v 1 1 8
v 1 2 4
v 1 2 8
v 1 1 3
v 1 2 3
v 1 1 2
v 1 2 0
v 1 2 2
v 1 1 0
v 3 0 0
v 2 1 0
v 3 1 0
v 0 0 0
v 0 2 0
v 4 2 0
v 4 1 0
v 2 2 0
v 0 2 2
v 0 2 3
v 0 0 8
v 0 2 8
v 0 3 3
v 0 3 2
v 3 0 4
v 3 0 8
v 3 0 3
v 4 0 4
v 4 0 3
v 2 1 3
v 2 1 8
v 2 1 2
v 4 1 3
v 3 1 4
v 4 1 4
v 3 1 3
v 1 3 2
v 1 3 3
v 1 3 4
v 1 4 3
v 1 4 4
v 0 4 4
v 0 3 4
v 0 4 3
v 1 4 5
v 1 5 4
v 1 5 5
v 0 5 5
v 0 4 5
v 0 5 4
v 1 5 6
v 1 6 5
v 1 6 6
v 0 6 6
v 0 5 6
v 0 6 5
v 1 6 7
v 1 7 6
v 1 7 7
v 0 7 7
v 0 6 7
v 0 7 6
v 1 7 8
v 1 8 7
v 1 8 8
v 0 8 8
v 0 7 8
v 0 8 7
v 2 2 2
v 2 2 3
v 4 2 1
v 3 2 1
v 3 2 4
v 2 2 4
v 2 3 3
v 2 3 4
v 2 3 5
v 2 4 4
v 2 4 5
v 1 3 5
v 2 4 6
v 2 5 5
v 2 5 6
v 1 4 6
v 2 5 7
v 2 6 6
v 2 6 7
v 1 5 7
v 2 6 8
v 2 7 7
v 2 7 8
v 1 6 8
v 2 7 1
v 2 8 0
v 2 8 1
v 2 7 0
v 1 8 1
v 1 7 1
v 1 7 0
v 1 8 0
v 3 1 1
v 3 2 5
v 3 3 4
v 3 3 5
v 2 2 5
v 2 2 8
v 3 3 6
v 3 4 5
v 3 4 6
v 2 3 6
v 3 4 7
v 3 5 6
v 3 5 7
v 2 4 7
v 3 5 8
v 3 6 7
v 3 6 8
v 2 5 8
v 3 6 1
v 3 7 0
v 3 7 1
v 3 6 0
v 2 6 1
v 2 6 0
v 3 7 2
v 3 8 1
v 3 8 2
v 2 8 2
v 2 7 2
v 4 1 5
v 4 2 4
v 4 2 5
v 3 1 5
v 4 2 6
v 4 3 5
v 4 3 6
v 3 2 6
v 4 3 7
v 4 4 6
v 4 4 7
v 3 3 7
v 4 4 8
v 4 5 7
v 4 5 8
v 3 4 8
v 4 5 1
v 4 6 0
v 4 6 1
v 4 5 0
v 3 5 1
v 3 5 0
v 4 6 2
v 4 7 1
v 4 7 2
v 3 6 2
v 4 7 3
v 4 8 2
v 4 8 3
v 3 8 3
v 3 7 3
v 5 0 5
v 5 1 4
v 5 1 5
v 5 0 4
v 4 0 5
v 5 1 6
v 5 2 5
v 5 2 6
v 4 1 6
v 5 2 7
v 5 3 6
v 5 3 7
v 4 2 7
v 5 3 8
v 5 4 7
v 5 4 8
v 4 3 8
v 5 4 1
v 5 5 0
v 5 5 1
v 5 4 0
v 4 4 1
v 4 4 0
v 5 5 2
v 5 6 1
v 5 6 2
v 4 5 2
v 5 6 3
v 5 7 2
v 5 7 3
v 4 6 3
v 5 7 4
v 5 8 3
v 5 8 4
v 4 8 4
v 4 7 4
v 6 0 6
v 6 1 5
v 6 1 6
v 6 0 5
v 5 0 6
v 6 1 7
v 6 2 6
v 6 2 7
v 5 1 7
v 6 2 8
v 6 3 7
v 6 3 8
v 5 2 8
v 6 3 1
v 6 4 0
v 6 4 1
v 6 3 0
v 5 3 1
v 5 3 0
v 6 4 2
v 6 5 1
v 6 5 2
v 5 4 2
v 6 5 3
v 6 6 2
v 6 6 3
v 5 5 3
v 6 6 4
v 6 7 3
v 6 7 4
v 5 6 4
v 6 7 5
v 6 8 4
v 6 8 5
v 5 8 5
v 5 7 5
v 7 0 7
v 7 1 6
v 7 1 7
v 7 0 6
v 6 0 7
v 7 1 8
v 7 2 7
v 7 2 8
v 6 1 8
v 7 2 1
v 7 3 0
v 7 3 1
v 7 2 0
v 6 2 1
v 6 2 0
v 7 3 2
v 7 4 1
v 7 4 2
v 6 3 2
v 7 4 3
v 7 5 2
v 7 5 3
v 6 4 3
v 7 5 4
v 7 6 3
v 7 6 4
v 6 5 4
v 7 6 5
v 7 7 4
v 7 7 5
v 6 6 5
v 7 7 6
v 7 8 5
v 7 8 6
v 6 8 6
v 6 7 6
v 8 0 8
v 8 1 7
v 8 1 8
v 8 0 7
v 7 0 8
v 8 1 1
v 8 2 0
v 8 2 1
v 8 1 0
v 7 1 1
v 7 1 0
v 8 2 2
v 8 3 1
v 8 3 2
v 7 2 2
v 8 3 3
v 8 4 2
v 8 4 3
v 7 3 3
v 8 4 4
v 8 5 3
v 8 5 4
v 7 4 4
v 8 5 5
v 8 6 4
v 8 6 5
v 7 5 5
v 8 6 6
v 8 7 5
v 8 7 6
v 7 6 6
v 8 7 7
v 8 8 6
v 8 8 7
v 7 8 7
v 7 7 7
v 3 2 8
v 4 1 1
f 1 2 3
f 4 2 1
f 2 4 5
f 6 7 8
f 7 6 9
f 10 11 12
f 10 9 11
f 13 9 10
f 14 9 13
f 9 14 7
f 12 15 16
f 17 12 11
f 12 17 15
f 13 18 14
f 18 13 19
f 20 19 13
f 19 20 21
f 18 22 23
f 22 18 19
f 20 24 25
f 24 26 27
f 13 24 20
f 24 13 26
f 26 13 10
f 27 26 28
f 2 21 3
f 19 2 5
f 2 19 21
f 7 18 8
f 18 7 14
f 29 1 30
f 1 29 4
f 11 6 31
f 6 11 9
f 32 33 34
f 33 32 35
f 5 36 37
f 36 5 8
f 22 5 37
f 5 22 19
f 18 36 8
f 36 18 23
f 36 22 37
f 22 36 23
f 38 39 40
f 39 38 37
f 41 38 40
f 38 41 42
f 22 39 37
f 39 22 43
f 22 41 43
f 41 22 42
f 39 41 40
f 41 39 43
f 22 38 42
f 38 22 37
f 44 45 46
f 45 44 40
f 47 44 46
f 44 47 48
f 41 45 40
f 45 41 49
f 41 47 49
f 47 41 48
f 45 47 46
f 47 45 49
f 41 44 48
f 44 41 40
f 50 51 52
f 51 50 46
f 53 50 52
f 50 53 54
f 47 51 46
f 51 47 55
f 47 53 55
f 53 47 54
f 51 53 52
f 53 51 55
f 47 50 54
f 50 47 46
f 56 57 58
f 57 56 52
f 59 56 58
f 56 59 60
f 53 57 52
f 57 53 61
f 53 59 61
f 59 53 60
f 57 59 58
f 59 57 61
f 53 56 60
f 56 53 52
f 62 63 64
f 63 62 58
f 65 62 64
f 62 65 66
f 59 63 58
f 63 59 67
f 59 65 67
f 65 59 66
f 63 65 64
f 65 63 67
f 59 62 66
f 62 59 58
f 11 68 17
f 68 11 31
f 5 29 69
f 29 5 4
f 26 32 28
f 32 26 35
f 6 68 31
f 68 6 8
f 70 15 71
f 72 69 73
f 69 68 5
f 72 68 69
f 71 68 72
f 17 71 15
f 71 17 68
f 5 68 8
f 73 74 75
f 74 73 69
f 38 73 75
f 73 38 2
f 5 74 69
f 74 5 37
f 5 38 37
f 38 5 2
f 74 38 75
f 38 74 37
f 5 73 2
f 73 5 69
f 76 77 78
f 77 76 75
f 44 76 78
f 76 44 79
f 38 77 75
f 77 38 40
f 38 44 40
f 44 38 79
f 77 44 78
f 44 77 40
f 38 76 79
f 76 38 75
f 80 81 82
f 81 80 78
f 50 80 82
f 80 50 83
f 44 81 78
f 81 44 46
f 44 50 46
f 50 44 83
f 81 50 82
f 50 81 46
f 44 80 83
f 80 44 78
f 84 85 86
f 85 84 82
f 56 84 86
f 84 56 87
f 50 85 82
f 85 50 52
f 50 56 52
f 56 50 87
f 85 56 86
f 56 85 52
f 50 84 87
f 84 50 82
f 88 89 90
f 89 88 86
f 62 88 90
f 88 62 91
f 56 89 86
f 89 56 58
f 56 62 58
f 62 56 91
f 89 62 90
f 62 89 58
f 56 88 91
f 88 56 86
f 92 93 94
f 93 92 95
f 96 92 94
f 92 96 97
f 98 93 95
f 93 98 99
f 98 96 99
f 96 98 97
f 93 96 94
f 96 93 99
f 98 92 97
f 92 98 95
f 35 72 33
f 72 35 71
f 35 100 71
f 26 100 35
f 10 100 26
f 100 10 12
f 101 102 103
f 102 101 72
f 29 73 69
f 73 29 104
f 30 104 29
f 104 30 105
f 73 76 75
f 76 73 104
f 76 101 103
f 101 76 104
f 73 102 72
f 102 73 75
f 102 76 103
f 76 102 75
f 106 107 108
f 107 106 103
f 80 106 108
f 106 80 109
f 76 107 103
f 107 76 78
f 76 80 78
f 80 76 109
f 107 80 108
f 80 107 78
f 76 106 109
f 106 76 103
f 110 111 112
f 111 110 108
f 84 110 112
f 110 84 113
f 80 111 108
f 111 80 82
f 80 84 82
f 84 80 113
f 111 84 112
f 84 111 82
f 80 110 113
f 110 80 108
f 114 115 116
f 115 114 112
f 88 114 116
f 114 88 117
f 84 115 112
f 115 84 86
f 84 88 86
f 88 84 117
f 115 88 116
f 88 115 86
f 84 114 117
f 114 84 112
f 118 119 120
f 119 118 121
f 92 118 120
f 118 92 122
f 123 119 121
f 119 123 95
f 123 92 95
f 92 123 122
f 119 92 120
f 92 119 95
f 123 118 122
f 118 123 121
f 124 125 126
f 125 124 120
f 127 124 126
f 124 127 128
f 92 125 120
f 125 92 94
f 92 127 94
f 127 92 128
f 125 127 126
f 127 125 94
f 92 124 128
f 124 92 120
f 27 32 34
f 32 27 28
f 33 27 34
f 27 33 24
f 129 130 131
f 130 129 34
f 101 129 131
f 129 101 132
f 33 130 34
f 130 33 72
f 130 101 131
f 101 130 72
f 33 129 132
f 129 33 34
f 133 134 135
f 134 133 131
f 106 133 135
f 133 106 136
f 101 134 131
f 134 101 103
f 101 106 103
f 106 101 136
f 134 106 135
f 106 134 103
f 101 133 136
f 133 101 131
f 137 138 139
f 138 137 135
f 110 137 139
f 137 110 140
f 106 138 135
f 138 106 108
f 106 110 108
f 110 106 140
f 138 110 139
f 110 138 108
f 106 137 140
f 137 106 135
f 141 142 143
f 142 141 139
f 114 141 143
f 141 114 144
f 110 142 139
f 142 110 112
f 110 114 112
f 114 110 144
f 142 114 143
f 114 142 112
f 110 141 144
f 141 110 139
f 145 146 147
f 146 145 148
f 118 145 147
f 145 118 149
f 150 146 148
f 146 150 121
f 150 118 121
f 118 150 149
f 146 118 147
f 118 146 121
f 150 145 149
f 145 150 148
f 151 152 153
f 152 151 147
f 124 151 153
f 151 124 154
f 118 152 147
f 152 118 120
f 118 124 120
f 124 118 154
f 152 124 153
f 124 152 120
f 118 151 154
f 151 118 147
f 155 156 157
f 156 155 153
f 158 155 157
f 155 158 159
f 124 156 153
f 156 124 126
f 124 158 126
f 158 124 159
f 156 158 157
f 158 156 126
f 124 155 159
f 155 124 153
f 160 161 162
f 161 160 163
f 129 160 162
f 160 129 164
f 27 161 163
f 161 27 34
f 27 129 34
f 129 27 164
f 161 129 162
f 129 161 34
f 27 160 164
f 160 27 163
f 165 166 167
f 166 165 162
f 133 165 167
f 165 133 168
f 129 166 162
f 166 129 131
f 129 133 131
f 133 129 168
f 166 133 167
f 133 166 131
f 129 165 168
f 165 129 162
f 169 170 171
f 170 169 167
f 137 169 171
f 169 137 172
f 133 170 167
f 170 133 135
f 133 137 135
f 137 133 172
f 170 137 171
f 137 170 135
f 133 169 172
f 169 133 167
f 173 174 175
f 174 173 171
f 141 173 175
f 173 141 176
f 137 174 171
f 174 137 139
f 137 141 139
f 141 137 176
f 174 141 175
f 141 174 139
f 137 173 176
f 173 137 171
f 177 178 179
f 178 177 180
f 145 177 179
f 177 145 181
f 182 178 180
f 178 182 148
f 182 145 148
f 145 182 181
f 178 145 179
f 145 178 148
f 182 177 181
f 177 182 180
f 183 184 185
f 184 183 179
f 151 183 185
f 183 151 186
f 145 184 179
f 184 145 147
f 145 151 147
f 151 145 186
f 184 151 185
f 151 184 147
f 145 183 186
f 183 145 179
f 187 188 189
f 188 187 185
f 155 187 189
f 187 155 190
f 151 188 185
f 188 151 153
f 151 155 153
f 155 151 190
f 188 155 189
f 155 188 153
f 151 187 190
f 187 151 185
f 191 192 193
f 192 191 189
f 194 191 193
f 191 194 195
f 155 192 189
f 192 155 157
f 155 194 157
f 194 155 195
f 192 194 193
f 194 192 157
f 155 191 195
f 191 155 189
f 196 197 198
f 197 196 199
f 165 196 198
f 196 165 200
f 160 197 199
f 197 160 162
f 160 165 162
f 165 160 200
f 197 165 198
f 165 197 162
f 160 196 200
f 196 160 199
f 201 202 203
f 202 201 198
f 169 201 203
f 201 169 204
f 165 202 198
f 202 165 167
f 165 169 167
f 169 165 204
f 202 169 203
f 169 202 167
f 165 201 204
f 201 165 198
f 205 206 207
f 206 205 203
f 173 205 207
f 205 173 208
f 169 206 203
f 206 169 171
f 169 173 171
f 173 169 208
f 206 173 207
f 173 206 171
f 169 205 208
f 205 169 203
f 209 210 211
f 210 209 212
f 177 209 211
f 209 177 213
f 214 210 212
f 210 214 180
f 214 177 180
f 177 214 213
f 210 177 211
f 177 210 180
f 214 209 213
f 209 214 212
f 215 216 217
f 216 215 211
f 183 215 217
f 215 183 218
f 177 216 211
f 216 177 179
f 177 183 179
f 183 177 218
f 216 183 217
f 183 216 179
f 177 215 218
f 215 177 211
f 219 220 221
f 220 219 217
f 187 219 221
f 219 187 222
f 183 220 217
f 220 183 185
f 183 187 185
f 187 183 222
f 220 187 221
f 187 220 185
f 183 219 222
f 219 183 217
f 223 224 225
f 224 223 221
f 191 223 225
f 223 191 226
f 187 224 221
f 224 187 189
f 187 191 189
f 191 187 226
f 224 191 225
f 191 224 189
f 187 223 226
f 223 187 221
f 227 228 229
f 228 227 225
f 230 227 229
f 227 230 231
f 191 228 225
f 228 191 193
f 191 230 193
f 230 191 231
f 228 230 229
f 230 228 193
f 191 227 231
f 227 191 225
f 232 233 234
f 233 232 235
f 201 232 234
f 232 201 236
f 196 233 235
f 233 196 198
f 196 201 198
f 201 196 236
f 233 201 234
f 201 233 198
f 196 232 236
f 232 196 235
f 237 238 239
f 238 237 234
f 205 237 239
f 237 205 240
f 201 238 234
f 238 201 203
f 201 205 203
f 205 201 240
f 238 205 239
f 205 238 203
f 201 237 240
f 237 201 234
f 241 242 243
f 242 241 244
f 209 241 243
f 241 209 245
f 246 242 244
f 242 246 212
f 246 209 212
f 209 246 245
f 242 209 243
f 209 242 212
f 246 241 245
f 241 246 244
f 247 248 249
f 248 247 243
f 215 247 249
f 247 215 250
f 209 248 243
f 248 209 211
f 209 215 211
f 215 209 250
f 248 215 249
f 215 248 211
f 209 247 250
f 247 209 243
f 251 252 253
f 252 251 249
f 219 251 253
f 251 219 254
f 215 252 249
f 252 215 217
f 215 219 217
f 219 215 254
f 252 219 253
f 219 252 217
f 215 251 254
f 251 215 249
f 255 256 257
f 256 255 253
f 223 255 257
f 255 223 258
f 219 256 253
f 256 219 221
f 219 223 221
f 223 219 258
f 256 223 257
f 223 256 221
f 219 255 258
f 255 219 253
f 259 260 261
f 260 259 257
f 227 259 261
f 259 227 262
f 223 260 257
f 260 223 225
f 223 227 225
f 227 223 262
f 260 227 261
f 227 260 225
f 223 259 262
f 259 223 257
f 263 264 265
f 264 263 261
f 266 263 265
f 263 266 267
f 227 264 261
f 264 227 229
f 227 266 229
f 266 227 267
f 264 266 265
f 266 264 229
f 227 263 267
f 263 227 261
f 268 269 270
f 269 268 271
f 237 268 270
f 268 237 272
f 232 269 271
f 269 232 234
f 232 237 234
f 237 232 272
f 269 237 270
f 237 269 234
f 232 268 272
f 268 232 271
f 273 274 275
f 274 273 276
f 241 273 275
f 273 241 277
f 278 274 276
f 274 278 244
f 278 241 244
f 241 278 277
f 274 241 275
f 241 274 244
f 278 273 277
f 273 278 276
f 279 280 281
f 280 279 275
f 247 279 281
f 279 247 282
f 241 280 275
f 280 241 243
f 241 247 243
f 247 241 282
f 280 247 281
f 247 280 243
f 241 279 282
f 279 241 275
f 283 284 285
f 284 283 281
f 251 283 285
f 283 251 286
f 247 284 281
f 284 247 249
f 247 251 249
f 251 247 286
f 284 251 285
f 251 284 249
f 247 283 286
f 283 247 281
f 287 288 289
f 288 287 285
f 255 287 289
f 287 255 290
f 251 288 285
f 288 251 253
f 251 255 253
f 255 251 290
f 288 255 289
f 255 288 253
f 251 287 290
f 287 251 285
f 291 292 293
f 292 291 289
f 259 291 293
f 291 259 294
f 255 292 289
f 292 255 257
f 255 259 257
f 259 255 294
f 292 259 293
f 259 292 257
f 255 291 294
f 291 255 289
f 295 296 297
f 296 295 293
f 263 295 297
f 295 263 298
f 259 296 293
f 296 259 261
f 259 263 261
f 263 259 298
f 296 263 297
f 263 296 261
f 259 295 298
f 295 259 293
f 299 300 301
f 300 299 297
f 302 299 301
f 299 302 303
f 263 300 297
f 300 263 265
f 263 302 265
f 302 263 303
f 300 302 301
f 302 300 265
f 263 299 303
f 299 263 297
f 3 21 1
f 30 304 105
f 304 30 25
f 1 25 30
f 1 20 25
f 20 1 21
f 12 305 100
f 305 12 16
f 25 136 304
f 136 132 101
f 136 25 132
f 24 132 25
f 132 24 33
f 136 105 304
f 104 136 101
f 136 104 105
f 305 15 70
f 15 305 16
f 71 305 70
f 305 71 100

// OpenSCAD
union() {
    translate([0, 0, 0]) cube([1, 1, 1]);
    translate([0, 1, 1]) cube([1, 1, 1]);
    translate([0, 2, 2]) cube([1, 1, 1]);
    translate([0, 3, 3]) cube([1, 1, 1]);
    translate([0, 4, 4]) cube([1, 1, 1]);
    translate([0, 5, 5]) cube([1, 1, 1]);
    translate([0, 6, 6]) cube([1, 1, 1]);
    translate([0, 7, 7]) cube([1, 1, 1]);
    translate([1, 0, 1]) cube([1, 1, 1]);
    translate([1, 1, 2]) cube([1, 1, 1]);
    translate([1, 2, 3]) cube([1, 1, 1]);
    translate([1, 3, 4]) cube([1, 1, 1]);
    translate([1, 4, 5]) cube([1, 1, 1]);
    translate([1, 5, 6]) cube([1, 1, 1]);
    translate([1, 6, 7]) cube([1, 1, 1]);
    translate([1, 7, 0]) cube([1, 1, 1]);
    translate([2, 0, 2]) cube([1, 1, 1]);
    translate([2, 1, 3]) cube([1, 1, 1]);
    translate([2, 2, 4]) cube([1, 1, 1]);
    translate([2, 3, 5]) cube([1, 1, 1]);
    translate([2, 4, 6]) cube([1, 1, 1]);
    translate([2, 5, 7]) cube([1, 1, 1]);
    translate([2, 6, 0]) cube([1, 1, 1]);
    translate([2, 7, 1]) cube([1, 1, 1]);
    translate([3, 0, 3]) cube([1, 1, 1]);
    translate([3, 1, 4]) cube([1, 1, 1]);
    translate([3, 2, 5]) cube([1, 1, 1]);
    translate([3, 3, 6]) cube([1, 1, 1]);
    translate([3, 4, 7]) cube([1, 1, 1]);
    translate([3, 5, 0]) cube([1, 1, 1]);
    translate([3, 6, 1]) cube([1, 1, 1]);
    translate([3, 7, 2]) cube([1, 1, 1]);
    translate([4, 0, 4]) cube([1, 1, 1]);
    translate([4, 1, 5]) cube([1, 1, 1]);
    translate([4, 2, 6]) cube([1, 1, 1]);
    translate([4, 3, 7]) cube([1, 1, 1]);
    translate([4, 4, 0]) cube([1, 1, 1]);
    translate([4, 5, 1]) cube([1, 1, 1]);
    translate([4, 6, 2]) cube([1, 1, 1]);
    translate([4, 7, 3]) cube([1, 1, 1]);
    translate([5, 0, 5]) cube([1, 1, 1]);
    translate([5, 1, 6]) cube([1, 1, 1]);
    translate([5, 2, 7]) cube([1, 1, 1]);
    translate([5, 3, 0]) cube([1, 1, 1]);
    translate([5, 4, 1]) cube([1, 1, 1]);
    translate([5, 5, 2]) cube([1, 1, 1]);
    translate([5, 6, 3]) cube([1, 1, 1]);
    translate([5, 7, 4]) cube([1, 1, 1]);
    translate([6, 0, 6]) cube([1, 1, 1]);
    translate([6, 1, 7]) cube([1, 1, 1]);
    translate([6, 2, 0]) cube([1, 1, 1]);
    translate([6, 3, 1]) cube([1, 1, 1]);
    translate([6, 4, 2]) cube([1, 1, 1]);
    translate([6, 5, 3]) cube([1, 1, 1]);
    translate([6, 6, 4]) cube([1, 1, 1]);
    translate([6, 7, 5]) cube([1, 1, 1]);
    translate([7, 0, 7]) cube([1, 1, 1]);
    translate([7, 1, 0]) cube([1, 1, 1]);
    translate([7, 2, 1]) cube([1, 1, 1]);
    translate([7, 3, 2]) cube([1, 1, 1]);
    translate([7, 4, 3]) cube([1, 1, 1]);
    translate([7, 5, 4]) cube([1, 1, 1]);
    translate([7, 6, 5]) cube([1, 1, 1]);
    translate([7, 7, 6]) cube([1, 1, 1]);
    translate([0, 0, 1]) cube([1, 1, 1]);
    translate([0, 0, 2]) cube([1, 1, 1]);
    translate([0, 0, 3]) cube([1, 1, 1]);
    translate([0, 0, 4]) cube([1, 1, 1]);
    translate([0, 0, 5]) cube([1, 1, 1]);
    translate([0, 0, 6]) cube([1, 1, 1]);
    translate([0, 0, 7]) cube([1, 1, 1]);
    translate([0, 1, 0]) cube([1, 1, 1]);
    translate([0, 1, 2]) cube([1, 1, 1]);
    translate([0, 1, 3]) cube([1, 1, 1]);
    translate([0, 1, 4]) cube([1, 1, 1]);
    translate([0, 1, 5]) cube([1, 1, 1]);
    translate([0, 1, 6]) cube([1, 1, 1]);
    translate([0, 1, 7]) cube([1, 1, 1]);
    translate([1, 0, 0]) cube([1, 1, 1]);
    translate([1, 0, 2]) cube([1, 1, 1]);
    translate([1, 0, 3]) cube([1, 1, 1]);
    translate([1, 0, 4]) cube([1, 1, 1]);
    translate([1, 0, 5]) cube([1, 1, 1]);
    translate([1, 0, 6]) cube([1, 1, 1]);
    translate([1, 0, 7]) cube([1, 1, 1]);
    translate([2, 0, 0]) cube([1, 1, 1]);
    translate([2, 0, 1]) cube([1, 1, 1]);
    translate([2, 0, 3]) cube([1, 1, 1]);
    translate([2, 0, 4]) cube([1, 1, 1]);
    translate([2, 0, 5]) cube([1, 1, 1]);
    translate([2, 0, 6]) cube([1, 1, 1]);
    translate([2, 0, 7]) cube([1, 1, 1]);
    translate([2, 1, 0]) cube([1, 1, 1]);
    translate([2, 1, 1]) cube([1, 1, 1]);
    translate([2, 1, 2]) cube([1, 1, 1]);
    translate([2, 1, 4]) cube([1, 1, 1]);
    translate([2, 1, 5]) cube([1, 1, 1]);
    translate([2, 1, 6]) cube([1, 1, 1]);
    translate([2, 1, 7]) cube([1, 1, 1]);
    translate([3, 1, 0]) cube([1, 1, 1]);
}
